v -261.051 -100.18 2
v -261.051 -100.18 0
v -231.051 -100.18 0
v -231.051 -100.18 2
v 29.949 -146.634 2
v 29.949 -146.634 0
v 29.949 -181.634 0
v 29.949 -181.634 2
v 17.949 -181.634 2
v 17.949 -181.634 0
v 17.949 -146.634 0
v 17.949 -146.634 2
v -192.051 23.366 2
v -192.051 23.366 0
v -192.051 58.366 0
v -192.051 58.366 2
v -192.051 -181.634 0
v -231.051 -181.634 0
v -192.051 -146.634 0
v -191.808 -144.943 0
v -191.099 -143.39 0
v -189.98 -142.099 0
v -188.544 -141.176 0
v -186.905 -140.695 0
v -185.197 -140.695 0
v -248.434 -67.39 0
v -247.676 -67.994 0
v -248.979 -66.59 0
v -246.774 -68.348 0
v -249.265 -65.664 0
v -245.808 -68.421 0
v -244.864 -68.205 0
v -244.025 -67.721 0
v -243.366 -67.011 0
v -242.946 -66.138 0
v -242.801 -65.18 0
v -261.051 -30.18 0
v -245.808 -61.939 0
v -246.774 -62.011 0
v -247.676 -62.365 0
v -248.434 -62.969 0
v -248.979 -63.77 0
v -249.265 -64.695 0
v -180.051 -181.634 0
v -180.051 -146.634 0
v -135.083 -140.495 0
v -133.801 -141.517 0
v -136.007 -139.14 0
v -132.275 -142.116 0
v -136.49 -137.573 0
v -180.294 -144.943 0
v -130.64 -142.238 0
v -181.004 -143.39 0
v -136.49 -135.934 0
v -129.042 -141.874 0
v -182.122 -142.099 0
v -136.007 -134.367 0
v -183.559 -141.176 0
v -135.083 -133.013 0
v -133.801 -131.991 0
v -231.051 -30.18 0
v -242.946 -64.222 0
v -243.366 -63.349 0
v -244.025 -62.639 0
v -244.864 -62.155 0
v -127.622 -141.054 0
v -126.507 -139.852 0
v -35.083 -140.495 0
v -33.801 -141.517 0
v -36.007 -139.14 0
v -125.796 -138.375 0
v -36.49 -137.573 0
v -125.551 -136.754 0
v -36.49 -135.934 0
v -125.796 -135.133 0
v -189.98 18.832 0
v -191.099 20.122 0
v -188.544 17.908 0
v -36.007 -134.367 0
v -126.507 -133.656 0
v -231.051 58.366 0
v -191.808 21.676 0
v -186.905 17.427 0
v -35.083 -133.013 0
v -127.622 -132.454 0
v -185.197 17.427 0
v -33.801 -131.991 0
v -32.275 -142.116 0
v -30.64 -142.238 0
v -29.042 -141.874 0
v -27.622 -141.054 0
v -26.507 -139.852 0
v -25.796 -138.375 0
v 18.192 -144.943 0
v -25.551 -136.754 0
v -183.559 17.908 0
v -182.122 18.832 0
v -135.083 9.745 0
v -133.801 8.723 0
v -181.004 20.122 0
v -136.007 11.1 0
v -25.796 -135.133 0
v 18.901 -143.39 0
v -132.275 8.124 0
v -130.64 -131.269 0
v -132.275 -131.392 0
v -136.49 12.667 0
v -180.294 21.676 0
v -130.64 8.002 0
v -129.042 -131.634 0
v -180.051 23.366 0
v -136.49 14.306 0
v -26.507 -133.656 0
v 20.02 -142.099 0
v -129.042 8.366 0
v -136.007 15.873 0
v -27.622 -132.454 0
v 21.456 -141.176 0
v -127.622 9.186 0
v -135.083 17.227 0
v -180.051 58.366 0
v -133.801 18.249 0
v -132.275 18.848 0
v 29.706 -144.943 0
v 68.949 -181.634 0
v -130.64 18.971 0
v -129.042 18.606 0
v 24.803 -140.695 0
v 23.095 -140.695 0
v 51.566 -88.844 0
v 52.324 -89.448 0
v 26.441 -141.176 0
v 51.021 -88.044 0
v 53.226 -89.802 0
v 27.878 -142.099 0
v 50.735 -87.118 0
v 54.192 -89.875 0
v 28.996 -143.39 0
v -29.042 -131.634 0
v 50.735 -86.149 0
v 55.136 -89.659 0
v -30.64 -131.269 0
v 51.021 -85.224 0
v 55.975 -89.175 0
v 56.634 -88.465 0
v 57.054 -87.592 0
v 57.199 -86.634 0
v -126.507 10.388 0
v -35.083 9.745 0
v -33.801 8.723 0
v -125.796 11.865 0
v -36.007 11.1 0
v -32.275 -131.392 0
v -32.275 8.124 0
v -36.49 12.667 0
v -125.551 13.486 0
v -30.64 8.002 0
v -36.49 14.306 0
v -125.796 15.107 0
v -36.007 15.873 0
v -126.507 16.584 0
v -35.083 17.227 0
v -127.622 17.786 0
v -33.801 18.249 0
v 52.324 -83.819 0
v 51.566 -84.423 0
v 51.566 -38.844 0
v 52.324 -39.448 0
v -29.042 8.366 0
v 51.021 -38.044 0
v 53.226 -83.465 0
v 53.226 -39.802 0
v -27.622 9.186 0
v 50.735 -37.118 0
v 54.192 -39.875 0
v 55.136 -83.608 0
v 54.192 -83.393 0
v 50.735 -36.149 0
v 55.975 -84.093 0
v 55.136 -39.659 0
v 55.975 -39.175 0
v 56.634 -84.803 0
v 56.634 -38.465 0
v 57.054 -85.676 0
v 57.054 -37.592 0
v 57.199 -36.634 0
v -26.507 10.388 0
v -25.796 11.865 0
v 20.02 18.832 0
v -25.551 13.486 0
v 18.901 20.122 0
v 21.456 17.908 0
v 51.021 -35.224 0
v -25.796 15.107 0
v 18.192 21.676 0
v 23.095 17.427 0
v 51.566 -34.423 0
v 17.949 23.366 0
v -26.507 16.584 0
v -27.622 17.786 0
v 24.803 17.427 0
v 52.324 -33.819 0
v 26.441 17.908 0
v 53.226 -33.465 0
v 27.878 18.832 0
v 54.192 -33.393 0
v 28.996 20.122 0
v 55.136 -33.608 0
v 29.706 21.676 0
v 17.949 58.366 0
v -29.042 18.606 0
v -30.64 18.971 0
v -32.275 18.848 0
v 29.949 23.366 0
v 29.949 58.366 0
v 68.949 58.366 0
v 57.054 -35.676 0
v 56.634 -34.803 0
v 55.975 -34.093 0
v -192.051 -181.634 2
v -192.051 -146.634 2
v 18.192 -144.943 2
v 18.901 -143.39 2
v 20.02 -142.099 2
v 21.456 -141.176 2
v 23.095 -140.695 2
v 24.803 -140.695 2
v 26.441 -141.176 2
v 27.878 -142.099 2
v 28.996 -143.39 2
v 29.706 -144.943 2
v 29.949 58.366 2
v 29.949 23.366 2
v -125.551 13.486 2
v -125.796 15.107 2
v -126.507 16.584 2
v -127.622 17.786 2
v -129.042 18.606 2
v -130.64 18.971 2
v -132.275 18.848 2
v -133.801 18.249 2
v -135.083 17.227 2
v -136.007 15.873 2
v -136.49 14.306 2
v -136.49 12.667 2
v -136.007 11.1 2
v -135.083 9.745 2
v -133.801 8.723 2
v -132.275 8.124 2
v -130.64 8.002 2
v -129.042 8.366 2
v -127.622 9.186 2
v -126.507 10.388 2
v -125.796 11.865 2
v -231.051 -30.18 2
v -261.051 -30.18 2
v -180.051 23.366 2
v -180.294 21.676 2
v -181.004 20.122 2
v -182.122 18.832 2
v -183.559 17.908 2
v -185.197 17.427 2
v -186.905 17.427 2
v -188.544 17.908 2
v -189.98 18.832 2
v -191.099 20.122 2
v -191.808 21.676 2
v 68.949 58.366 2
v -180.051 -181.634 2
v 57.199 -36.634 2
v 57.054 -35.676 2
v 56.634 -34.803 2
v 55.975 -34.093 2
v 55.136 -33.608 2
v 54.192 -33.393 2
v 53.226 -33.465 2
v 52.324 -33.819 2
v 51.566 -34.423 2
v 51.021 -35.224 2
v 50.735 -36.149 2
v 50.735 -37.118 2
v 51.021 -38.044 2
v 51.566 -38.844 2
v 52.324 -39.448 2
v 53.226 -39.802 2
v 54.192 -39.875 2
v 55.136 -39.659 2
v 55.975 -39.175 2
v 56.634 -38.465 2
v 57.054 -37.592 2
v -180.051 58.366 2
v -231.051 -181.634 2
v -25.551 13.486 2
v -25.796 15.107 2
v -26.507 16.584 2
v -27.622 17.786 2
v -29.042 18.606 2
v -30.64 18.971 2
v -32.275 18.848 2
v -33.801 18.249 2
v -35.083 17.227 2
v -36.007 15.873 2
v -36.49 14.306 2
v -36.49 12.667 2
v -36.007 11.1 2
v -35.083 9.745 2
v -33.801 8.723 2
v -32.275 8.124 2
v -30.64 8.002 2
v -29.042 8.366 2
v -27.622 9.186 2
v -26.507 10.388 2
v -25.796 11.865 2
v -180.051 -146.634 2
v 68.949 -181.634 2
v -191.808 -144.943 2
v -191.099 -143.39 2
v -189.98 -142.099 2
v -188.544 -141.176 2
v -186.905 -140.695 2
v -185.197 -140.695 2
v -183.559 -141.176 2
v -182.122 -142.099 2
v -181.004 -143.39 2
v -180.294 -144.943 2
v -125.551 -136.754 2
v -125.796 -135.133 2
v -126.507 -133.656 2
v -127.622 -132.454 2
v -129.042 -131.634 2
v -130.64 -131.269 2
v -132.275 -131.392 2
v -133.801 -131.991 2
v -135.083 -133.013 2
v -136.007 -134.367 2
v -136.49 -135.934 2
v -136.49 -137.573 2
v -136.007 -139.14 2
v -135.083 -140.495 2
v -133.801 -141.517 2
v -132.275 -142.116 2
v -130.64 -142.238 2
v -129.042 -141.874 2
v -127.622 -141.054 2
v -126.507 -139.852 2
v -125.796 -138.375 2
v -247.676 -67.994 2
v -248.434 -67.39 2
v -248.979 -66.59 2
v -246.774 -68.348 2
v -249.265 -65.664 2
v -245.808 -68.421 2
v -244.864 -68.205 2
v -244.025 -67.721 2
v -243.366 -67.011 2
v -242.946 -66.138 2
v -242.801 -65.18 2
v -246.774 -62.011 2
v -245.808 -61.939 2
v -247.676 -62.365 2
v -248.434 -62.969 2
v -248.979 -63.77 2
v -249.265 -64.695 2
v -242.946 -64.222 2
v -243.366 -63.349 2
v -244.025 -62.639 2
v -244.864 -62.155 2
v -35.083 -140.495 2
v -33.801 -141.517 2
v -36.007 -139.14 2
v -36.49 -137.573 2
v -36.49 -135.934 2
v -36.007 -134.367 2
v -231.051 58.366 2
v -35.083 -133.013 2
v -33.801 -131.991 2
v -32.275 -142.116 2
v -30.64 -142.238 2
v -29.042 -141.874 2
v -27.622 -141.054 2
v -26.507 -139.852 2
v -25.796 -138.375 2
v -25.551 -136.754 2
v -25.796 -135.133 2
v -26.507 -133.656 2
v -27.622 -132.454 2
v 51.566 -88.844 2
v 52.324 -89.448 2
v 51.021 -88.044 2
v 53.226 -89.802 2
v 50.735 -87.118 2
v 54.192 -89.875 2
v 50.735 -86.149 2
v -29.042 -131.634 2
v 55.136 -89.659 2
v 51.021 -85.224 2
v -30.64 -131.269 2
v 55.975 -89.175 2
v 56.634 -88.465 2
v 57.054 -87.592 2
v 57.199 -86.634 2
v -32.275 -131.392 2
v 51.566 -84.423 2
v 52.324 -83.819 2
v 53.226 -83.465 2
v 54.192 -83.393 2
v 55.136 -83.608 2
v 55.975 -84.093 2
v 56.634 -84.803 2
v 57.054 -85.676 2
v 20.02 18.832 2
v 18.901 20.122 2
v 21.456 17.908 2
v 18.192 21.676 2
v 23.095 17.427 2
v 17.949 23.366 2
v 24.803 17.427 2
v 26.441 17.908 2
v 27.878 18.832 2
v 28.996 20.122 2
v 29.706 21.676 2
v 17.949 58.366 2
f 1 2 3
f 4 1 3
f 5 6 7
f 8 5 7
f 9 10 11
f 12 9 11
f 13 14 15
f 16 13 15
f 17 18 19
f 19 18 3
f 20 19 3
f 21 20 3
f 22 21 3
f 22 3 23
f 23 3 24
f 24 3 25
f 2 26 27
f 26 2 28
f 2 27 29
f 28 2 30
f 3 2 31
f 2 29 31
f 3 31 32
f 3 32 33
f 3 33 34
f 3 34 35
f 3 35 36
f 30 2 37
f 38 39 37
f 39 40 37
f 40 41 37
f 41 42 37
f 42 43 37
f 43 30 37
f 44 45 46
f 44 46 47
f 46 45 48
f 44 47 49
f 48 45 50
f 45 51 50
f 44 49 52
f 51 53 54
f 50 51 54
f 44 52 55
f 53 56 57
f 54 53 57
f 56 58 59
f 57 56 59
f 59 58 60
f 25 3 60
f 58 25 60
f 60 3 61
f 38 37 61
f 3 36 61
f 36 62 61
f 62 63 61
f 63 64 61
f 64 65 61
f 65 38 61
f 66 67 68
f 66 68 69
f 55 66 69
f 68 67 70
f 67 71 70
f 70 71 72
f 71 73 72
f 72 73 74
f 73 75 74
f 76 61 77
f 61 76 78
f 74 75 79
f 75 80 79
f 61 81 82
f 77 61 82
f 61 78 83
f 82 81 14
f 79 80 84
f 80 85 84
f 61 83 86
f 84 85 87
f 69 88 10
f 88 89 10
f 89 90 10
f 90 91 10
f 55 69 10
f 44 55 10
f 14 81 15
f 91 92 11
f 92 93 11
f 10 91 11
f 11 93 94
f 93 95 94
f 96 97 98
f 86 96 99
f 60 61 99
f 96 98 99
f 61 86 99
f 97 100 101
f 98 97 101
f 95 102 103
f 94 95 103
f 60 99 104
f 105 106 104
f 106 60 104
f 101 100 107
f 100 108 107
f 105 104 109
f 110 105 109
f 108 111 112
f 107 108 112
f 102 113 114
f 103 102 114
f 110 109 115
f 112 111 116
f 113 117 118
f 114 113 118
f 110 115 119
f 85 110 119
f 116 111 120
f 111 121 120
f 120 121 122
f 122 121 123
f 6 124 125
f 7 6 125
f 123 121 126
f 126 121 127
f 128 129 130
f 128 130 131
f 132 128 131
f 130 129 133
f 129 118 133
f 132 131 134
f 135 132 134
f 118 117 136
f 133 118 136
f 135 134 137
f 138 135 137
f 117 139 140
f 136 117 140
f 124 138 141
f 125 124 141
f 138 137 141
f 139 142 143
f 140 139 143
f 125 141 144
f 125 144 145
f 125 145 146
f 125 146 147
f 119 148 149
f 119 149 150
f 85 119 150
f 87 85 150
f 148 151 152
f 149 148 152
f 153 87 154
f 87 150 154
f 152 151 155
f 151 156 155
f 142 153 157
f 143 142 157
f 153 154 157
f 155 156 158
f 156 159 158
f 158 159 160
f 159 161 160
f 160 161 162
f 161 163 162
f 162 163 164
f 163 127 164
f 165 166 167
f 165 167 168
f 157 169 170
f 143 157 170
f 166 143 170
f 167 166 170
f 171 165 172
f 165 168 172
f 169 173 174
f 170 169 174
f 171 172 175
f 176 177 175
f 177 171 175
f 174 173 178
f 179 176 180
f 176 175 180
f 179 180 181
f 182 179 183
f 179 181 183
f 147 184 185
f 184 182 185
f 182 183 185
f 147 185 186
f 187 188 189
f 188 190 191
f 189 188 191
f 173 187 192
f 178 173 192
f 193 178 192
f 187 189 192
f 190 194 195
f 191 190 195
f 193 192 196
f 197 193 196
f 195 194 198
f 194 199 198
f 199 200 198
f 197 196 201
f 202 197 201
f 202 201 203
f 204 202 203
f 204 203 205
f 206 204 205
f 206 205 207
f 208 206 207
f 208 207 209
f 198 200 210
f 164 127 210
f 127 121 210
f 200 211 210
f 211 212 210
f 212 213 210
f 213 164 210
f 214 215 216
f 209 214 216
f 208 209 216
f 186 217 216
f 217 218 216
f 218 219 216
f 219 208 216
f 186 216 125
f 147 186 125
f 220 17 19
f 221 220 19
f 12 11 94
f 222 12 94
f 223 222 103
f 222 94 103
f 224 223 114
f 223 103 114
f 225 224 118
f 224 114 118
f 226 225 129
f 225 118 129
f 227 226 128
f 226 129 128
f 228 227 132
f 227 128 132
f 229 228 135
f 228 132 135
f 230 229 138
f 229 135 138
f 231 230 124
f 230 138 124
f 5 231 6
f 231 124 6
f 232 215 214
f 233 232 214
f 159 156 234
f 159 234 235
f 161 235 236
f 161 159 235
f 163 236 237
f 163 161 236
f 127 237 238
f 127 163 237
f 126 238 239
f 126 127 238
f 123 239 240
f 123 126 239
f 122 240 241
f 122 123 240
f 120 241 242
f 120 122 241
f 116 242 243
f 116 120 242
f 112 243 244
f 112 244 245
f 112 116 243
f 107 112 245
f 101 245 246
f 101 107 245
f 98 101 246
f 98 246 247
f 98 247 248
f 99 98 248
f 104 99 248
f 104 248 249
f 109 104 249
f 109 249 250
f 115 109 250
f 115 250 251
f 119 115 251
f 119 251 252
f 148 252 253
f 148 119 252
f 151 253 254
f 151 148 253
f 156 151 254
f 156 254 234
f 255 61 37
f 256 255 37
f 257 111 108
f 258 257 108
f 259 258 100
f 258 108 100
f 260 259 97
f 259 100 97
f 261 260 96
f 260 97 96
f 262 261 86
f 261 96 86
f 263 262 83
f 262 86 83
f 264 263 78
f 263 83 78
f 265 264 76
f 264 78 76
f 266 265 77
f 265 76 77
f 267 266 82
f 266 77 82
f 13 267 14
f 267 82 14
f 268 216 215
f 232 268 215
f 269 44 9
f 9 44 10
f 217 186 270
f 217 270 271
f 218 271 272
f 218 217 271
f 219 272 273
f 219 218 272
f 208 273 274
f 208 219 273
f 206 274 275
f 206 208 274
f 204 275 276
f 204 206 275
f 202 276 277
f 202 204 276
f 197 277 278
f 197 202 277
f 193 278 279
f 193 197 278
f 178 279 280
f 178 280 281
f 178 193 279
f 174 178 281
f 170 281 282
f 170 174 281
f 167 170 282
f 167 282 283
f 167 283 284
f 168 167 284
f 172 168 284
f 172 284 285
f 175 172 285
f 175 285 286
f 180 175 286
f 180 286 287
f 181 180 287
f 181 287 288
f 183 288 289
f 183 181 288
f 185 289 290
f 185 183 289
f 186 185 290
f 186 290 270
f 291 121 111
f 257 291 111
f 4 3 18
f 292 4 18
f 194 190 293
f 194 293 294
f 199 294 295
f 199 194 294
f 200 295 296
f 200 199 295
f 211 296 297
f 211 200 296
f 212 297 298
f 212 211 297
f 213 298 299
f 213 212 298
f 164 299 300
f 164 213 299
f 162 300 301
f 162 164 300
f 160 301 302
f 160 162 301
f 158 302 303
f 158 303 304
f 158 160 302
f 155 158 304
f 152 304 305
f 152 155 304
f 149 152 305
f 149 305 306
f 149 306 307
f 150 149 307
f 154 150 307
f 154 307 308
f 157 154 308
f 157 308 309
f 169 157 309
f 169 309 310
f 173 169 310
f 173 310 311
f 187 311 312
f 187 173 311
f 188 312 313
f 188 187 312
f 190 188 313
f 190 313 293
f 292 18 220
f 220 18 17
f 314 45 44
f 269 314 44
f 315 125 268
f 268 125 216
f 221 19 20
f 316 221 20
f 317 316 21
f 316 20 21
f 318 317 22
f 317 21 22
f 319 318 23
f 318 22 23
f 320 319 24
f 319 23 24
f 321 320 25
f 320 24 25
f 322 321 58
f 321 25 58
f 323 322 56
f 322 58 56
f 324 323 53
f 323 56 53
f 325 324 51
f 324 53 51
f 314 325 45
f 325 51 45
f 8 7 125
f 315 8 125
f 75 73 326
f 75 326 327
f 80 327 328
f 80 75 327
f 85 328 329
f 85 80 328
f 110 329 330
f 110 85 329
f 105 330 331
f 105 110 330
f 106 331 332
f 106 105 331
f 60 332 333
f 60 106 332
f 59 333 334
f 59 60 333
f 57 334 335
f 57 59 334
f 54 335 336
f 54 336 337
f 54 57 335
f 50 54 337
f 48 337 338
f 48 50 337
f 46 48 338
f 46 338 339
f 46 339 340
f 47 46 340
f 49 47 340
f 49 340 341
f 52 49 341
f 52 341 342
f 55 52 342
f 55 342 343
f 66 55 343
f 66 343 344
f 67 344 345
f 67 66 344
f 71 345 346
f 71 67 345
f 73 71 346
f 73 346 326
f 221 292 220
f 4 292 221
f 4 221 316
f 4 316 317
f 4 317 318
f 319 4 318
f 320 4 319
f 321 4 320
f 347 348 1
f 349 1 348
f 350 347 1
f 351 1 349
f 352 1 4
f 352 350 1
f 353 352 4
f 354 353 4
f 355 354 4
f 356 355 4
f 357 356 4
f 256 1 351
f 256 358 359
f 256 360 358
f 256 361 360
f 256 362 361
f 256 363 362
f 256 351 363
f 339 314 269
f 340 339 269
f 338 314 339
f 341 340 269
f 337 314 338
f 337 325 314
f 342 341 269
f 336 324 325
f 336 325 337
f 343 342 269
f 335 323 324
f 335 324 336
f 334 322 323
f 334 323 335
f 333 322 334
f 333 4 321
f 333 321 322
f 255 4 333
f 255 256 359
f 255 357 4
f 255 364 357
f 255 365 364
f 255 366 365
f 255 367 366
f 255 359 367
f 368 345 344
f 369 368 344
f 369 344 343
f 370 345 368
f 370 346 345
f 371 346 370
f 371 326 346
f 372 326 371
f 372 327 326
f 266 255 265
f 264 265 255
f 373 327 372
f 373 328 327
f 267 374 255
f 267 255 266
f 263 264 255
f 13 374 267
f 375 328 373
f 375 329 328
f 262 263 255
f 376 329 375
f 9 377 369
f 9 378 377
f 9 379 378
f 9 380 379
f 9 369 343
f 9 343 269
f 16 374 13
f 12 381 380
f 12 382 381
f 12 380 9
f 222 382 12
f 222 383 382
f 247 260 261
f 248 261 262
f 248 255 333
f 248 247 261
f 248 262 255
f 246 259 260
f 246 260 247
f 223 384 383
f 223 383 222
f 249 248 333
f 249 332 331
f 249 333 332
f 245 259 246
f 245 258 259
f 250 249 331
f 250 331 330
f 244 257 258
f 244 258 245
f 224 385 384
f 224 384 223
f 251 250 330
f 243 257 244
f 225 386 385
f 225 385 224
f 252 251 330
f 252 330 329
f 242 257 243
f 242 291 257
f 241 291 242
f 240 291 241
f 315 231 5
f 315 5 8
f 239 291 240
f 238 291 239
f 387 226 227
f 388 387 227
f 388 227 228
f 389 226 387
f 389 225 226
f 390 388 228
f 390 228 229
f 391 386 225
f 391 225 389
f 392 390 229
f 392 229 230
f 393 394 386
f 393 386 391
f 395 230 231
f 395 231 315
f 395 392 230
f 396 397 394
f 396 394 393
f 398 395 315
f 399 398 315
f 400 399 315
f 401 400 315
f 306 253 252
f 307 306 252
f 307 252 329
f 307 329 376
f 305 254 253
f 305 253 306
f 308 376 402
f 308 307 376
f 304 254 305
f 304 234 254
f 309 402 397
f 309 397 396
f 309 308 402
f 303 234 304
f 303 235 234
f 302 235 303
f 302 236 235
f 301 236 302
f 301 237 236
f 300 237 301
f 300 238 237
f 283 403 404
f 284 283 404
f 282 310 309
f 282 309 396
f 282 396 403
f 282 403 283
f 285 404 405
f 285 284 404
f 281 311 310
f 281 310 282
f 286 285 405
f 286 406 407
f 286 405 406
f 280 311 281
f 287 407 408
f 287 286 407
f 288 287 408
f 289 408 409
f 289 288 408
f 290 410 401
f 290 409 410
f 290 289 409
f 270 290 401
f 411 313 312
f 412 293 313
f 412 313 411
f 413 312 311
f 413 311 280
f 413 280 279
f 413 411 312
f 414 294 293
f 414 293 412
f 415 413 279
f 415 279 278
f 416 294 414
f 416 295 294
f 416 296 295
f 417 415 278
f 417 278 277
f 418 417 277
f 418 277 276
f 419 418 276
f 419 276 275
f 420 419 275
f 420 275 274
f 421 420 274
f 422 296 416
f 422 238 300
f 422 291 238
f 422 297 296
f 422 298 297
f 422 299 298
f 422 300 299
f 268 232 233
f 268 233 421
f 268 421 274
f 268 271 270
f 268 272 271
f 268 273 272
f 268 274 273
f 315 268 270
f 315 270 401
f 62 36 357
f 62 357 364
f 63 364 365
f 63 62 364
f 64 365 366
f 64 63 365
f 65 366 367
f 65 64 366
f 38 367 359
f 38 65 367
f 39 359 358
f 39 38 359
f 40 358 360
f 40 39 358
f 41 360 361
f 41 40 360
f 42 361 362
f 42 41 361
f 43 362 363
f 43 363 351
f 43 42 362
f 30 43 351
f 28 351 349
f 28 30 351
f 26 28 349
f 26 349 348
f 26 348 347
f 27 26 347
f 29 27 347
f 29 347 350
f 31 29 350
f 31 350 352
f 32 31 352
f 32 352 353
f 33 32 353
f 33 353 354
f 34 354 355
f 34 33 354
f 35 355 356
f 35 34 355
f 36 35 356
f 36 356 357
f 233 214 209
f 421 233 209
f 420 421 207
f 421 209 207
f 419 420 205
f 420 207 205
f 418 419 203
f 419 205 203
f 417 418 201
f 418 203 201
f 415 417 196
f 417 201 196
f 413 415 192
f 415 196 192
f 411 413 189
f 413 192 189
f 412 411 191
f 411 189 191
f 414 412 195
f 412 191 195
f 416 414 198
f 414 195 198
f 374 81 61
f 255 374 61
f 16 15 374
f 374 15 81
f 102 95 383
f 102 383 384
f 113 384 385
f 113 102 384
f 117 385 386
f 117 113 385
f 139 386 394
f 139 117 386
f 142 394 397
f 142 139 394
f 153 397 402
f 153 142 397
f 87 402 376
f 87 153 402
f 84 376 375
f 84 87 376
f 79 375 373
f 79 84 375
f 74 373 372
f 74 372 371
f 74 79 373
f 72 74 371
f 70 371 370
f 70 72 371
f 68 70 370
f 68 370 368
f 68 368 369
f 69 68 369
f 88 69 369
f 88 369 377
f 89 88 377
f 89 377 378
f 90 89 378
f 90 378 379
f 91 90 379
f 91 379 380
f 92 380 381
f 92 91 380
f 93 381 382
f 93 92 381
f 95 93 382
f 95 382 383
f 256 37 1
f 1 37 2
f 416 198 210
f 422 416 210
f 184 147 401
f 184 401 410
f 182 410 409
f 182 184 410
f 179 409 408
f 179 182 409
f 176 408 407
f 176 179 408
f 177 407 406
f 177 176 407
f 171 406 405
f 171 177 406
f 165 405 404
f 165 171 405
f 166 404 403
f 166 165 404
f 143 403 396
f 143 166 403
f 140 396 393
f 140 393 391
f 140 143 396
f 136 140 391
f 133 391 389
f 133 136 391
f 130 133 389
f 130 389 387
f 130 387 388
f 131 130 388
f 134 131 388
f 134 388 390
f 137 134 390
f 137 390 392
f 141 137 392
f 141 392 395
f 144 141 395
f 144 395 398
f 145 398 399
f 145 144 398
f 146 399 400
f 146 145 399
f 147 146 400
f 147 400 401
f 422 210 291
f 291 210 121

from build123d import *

# Parameters (mm, degrees)
SKETCH1_R           = 5.5
SKETCH1_R_2         = 3.25
BOSS_EXTRUDE1_DEPTH = 2


with BuildPart() as part:
    # Sketch1 → Boss-Extrude1 (new body)
    with BuildSketch(Plane.XY):
        with BuildLine():
            Line((68.948821818, 58.366235714), (29.948821818, 58.366235714))
            Line((29.948821818, 58.366235714), (29.948821818, 23.366235714))
            ThreePointArc((29.948821818, 23.366235714), (23.948821818, 17.366235714), (17.948821818, 23.366235714))
            Line((17.948821818, 23.366235714), (17.948821818, 58.366235714))
            Line((17.948821818, 58.366235714), (-180.051178182, 58.366235714))
            Line((-180.051178182, 58.366235714), (-180.051178182, 23.366235714))
            ThreePointArc((-180.051178182, 23.366235714), (-186.051178182, 17.366235714), (-192.051178182, 23.366235714))
            Line((-192.051178182, 23.366235714), (-192.051178182, 58.366235714))
            Line((-192.051178182, 58.366235714), (-231.051178182, 58.366235714))
            Line((-231.051178182, 58.366235714), (-231.051178182, -30.179856115))
            Line((-231.051178182, -30.179856115), (-261.051178182, -30.179856115))
            Line((-261.051178182, -30.179856115), (-261.051178182, -100.179856115))
            Line((-261.051178182, -100.179856115), (-231.051178182, -100.179856115))
            Line((-231.051178182, -100.179856115), (-231.051178182, -181.633764286))
            Line((-231.051178182, -181.633764286), (-192.051178182, -181.633764286))
            Line((-192.051178182, -181.633764286), (-192.051178182, -146.633764286))
            ThreePointArc((-192.051178182, -146.633764286), (-186.051178182, -140.633764286), (-180.051178182, -146.633764286))
            Line((-180.051178182, -146.633764286), (-180.051178182, -181.633764286))
            Line((-180.051178182, -181.633764286), (17.948821818, -181.633764286))
            Line((17.948821818, -181.633764286), (17.948821818, -146.633764286))
            ThreePointArc((17.948821818, -146.633764286), (23.948821818, -140.633764286), (29.948821818, -146.633764286))
            Line((29.948821818, -146.633764286), (29.948821818, -181.633764286))
            Line((29.948821818, -181.633764286), (68.948821818, -181.633764286))
            Line((68.948821818, -181.633764286), (68.948821818, -26.633764286))
            Line((68.948821818, -26.633764286), (68.948821818, 58.366235714))
        make_face()
        with Locations((-131.051178182, 13.486235714)):
            Circle(SKETCH1_R, mode=Mode.SUBTRACT)
        with Locations((53.948821818, -36.633764286)):
            Circle(SKETCH1_R_2, mode=Mode.SUBTRACT)
        with Locations((53.948821818, -86.633764286)):
            Circle(SKETCH1_R_2, mode=Mode.SUBTRACT)
        with Locations((-246.051178182, -65.179856115)):
            Circle(SKETCH1_R_2, mode=Mode.SUBTRACT)
        with Locations((-31.051178182, -136.753764286)):
            Circle(SKETCH1_R, mode=Mode.SUBTRACT)
        with Locations((-131.051178182, -136.753764286)):
            Circle(SKETCH1_R, mode=Mode.SUBTRACT)
        with Locations((-31.051178182, 13.486235714)):
            Circle(SKETCH1_R, mode=Mode.SUBTRACT)
    extrude(amount=BOSS_EXTRUDE1_DEPTH)


solid = part.part
